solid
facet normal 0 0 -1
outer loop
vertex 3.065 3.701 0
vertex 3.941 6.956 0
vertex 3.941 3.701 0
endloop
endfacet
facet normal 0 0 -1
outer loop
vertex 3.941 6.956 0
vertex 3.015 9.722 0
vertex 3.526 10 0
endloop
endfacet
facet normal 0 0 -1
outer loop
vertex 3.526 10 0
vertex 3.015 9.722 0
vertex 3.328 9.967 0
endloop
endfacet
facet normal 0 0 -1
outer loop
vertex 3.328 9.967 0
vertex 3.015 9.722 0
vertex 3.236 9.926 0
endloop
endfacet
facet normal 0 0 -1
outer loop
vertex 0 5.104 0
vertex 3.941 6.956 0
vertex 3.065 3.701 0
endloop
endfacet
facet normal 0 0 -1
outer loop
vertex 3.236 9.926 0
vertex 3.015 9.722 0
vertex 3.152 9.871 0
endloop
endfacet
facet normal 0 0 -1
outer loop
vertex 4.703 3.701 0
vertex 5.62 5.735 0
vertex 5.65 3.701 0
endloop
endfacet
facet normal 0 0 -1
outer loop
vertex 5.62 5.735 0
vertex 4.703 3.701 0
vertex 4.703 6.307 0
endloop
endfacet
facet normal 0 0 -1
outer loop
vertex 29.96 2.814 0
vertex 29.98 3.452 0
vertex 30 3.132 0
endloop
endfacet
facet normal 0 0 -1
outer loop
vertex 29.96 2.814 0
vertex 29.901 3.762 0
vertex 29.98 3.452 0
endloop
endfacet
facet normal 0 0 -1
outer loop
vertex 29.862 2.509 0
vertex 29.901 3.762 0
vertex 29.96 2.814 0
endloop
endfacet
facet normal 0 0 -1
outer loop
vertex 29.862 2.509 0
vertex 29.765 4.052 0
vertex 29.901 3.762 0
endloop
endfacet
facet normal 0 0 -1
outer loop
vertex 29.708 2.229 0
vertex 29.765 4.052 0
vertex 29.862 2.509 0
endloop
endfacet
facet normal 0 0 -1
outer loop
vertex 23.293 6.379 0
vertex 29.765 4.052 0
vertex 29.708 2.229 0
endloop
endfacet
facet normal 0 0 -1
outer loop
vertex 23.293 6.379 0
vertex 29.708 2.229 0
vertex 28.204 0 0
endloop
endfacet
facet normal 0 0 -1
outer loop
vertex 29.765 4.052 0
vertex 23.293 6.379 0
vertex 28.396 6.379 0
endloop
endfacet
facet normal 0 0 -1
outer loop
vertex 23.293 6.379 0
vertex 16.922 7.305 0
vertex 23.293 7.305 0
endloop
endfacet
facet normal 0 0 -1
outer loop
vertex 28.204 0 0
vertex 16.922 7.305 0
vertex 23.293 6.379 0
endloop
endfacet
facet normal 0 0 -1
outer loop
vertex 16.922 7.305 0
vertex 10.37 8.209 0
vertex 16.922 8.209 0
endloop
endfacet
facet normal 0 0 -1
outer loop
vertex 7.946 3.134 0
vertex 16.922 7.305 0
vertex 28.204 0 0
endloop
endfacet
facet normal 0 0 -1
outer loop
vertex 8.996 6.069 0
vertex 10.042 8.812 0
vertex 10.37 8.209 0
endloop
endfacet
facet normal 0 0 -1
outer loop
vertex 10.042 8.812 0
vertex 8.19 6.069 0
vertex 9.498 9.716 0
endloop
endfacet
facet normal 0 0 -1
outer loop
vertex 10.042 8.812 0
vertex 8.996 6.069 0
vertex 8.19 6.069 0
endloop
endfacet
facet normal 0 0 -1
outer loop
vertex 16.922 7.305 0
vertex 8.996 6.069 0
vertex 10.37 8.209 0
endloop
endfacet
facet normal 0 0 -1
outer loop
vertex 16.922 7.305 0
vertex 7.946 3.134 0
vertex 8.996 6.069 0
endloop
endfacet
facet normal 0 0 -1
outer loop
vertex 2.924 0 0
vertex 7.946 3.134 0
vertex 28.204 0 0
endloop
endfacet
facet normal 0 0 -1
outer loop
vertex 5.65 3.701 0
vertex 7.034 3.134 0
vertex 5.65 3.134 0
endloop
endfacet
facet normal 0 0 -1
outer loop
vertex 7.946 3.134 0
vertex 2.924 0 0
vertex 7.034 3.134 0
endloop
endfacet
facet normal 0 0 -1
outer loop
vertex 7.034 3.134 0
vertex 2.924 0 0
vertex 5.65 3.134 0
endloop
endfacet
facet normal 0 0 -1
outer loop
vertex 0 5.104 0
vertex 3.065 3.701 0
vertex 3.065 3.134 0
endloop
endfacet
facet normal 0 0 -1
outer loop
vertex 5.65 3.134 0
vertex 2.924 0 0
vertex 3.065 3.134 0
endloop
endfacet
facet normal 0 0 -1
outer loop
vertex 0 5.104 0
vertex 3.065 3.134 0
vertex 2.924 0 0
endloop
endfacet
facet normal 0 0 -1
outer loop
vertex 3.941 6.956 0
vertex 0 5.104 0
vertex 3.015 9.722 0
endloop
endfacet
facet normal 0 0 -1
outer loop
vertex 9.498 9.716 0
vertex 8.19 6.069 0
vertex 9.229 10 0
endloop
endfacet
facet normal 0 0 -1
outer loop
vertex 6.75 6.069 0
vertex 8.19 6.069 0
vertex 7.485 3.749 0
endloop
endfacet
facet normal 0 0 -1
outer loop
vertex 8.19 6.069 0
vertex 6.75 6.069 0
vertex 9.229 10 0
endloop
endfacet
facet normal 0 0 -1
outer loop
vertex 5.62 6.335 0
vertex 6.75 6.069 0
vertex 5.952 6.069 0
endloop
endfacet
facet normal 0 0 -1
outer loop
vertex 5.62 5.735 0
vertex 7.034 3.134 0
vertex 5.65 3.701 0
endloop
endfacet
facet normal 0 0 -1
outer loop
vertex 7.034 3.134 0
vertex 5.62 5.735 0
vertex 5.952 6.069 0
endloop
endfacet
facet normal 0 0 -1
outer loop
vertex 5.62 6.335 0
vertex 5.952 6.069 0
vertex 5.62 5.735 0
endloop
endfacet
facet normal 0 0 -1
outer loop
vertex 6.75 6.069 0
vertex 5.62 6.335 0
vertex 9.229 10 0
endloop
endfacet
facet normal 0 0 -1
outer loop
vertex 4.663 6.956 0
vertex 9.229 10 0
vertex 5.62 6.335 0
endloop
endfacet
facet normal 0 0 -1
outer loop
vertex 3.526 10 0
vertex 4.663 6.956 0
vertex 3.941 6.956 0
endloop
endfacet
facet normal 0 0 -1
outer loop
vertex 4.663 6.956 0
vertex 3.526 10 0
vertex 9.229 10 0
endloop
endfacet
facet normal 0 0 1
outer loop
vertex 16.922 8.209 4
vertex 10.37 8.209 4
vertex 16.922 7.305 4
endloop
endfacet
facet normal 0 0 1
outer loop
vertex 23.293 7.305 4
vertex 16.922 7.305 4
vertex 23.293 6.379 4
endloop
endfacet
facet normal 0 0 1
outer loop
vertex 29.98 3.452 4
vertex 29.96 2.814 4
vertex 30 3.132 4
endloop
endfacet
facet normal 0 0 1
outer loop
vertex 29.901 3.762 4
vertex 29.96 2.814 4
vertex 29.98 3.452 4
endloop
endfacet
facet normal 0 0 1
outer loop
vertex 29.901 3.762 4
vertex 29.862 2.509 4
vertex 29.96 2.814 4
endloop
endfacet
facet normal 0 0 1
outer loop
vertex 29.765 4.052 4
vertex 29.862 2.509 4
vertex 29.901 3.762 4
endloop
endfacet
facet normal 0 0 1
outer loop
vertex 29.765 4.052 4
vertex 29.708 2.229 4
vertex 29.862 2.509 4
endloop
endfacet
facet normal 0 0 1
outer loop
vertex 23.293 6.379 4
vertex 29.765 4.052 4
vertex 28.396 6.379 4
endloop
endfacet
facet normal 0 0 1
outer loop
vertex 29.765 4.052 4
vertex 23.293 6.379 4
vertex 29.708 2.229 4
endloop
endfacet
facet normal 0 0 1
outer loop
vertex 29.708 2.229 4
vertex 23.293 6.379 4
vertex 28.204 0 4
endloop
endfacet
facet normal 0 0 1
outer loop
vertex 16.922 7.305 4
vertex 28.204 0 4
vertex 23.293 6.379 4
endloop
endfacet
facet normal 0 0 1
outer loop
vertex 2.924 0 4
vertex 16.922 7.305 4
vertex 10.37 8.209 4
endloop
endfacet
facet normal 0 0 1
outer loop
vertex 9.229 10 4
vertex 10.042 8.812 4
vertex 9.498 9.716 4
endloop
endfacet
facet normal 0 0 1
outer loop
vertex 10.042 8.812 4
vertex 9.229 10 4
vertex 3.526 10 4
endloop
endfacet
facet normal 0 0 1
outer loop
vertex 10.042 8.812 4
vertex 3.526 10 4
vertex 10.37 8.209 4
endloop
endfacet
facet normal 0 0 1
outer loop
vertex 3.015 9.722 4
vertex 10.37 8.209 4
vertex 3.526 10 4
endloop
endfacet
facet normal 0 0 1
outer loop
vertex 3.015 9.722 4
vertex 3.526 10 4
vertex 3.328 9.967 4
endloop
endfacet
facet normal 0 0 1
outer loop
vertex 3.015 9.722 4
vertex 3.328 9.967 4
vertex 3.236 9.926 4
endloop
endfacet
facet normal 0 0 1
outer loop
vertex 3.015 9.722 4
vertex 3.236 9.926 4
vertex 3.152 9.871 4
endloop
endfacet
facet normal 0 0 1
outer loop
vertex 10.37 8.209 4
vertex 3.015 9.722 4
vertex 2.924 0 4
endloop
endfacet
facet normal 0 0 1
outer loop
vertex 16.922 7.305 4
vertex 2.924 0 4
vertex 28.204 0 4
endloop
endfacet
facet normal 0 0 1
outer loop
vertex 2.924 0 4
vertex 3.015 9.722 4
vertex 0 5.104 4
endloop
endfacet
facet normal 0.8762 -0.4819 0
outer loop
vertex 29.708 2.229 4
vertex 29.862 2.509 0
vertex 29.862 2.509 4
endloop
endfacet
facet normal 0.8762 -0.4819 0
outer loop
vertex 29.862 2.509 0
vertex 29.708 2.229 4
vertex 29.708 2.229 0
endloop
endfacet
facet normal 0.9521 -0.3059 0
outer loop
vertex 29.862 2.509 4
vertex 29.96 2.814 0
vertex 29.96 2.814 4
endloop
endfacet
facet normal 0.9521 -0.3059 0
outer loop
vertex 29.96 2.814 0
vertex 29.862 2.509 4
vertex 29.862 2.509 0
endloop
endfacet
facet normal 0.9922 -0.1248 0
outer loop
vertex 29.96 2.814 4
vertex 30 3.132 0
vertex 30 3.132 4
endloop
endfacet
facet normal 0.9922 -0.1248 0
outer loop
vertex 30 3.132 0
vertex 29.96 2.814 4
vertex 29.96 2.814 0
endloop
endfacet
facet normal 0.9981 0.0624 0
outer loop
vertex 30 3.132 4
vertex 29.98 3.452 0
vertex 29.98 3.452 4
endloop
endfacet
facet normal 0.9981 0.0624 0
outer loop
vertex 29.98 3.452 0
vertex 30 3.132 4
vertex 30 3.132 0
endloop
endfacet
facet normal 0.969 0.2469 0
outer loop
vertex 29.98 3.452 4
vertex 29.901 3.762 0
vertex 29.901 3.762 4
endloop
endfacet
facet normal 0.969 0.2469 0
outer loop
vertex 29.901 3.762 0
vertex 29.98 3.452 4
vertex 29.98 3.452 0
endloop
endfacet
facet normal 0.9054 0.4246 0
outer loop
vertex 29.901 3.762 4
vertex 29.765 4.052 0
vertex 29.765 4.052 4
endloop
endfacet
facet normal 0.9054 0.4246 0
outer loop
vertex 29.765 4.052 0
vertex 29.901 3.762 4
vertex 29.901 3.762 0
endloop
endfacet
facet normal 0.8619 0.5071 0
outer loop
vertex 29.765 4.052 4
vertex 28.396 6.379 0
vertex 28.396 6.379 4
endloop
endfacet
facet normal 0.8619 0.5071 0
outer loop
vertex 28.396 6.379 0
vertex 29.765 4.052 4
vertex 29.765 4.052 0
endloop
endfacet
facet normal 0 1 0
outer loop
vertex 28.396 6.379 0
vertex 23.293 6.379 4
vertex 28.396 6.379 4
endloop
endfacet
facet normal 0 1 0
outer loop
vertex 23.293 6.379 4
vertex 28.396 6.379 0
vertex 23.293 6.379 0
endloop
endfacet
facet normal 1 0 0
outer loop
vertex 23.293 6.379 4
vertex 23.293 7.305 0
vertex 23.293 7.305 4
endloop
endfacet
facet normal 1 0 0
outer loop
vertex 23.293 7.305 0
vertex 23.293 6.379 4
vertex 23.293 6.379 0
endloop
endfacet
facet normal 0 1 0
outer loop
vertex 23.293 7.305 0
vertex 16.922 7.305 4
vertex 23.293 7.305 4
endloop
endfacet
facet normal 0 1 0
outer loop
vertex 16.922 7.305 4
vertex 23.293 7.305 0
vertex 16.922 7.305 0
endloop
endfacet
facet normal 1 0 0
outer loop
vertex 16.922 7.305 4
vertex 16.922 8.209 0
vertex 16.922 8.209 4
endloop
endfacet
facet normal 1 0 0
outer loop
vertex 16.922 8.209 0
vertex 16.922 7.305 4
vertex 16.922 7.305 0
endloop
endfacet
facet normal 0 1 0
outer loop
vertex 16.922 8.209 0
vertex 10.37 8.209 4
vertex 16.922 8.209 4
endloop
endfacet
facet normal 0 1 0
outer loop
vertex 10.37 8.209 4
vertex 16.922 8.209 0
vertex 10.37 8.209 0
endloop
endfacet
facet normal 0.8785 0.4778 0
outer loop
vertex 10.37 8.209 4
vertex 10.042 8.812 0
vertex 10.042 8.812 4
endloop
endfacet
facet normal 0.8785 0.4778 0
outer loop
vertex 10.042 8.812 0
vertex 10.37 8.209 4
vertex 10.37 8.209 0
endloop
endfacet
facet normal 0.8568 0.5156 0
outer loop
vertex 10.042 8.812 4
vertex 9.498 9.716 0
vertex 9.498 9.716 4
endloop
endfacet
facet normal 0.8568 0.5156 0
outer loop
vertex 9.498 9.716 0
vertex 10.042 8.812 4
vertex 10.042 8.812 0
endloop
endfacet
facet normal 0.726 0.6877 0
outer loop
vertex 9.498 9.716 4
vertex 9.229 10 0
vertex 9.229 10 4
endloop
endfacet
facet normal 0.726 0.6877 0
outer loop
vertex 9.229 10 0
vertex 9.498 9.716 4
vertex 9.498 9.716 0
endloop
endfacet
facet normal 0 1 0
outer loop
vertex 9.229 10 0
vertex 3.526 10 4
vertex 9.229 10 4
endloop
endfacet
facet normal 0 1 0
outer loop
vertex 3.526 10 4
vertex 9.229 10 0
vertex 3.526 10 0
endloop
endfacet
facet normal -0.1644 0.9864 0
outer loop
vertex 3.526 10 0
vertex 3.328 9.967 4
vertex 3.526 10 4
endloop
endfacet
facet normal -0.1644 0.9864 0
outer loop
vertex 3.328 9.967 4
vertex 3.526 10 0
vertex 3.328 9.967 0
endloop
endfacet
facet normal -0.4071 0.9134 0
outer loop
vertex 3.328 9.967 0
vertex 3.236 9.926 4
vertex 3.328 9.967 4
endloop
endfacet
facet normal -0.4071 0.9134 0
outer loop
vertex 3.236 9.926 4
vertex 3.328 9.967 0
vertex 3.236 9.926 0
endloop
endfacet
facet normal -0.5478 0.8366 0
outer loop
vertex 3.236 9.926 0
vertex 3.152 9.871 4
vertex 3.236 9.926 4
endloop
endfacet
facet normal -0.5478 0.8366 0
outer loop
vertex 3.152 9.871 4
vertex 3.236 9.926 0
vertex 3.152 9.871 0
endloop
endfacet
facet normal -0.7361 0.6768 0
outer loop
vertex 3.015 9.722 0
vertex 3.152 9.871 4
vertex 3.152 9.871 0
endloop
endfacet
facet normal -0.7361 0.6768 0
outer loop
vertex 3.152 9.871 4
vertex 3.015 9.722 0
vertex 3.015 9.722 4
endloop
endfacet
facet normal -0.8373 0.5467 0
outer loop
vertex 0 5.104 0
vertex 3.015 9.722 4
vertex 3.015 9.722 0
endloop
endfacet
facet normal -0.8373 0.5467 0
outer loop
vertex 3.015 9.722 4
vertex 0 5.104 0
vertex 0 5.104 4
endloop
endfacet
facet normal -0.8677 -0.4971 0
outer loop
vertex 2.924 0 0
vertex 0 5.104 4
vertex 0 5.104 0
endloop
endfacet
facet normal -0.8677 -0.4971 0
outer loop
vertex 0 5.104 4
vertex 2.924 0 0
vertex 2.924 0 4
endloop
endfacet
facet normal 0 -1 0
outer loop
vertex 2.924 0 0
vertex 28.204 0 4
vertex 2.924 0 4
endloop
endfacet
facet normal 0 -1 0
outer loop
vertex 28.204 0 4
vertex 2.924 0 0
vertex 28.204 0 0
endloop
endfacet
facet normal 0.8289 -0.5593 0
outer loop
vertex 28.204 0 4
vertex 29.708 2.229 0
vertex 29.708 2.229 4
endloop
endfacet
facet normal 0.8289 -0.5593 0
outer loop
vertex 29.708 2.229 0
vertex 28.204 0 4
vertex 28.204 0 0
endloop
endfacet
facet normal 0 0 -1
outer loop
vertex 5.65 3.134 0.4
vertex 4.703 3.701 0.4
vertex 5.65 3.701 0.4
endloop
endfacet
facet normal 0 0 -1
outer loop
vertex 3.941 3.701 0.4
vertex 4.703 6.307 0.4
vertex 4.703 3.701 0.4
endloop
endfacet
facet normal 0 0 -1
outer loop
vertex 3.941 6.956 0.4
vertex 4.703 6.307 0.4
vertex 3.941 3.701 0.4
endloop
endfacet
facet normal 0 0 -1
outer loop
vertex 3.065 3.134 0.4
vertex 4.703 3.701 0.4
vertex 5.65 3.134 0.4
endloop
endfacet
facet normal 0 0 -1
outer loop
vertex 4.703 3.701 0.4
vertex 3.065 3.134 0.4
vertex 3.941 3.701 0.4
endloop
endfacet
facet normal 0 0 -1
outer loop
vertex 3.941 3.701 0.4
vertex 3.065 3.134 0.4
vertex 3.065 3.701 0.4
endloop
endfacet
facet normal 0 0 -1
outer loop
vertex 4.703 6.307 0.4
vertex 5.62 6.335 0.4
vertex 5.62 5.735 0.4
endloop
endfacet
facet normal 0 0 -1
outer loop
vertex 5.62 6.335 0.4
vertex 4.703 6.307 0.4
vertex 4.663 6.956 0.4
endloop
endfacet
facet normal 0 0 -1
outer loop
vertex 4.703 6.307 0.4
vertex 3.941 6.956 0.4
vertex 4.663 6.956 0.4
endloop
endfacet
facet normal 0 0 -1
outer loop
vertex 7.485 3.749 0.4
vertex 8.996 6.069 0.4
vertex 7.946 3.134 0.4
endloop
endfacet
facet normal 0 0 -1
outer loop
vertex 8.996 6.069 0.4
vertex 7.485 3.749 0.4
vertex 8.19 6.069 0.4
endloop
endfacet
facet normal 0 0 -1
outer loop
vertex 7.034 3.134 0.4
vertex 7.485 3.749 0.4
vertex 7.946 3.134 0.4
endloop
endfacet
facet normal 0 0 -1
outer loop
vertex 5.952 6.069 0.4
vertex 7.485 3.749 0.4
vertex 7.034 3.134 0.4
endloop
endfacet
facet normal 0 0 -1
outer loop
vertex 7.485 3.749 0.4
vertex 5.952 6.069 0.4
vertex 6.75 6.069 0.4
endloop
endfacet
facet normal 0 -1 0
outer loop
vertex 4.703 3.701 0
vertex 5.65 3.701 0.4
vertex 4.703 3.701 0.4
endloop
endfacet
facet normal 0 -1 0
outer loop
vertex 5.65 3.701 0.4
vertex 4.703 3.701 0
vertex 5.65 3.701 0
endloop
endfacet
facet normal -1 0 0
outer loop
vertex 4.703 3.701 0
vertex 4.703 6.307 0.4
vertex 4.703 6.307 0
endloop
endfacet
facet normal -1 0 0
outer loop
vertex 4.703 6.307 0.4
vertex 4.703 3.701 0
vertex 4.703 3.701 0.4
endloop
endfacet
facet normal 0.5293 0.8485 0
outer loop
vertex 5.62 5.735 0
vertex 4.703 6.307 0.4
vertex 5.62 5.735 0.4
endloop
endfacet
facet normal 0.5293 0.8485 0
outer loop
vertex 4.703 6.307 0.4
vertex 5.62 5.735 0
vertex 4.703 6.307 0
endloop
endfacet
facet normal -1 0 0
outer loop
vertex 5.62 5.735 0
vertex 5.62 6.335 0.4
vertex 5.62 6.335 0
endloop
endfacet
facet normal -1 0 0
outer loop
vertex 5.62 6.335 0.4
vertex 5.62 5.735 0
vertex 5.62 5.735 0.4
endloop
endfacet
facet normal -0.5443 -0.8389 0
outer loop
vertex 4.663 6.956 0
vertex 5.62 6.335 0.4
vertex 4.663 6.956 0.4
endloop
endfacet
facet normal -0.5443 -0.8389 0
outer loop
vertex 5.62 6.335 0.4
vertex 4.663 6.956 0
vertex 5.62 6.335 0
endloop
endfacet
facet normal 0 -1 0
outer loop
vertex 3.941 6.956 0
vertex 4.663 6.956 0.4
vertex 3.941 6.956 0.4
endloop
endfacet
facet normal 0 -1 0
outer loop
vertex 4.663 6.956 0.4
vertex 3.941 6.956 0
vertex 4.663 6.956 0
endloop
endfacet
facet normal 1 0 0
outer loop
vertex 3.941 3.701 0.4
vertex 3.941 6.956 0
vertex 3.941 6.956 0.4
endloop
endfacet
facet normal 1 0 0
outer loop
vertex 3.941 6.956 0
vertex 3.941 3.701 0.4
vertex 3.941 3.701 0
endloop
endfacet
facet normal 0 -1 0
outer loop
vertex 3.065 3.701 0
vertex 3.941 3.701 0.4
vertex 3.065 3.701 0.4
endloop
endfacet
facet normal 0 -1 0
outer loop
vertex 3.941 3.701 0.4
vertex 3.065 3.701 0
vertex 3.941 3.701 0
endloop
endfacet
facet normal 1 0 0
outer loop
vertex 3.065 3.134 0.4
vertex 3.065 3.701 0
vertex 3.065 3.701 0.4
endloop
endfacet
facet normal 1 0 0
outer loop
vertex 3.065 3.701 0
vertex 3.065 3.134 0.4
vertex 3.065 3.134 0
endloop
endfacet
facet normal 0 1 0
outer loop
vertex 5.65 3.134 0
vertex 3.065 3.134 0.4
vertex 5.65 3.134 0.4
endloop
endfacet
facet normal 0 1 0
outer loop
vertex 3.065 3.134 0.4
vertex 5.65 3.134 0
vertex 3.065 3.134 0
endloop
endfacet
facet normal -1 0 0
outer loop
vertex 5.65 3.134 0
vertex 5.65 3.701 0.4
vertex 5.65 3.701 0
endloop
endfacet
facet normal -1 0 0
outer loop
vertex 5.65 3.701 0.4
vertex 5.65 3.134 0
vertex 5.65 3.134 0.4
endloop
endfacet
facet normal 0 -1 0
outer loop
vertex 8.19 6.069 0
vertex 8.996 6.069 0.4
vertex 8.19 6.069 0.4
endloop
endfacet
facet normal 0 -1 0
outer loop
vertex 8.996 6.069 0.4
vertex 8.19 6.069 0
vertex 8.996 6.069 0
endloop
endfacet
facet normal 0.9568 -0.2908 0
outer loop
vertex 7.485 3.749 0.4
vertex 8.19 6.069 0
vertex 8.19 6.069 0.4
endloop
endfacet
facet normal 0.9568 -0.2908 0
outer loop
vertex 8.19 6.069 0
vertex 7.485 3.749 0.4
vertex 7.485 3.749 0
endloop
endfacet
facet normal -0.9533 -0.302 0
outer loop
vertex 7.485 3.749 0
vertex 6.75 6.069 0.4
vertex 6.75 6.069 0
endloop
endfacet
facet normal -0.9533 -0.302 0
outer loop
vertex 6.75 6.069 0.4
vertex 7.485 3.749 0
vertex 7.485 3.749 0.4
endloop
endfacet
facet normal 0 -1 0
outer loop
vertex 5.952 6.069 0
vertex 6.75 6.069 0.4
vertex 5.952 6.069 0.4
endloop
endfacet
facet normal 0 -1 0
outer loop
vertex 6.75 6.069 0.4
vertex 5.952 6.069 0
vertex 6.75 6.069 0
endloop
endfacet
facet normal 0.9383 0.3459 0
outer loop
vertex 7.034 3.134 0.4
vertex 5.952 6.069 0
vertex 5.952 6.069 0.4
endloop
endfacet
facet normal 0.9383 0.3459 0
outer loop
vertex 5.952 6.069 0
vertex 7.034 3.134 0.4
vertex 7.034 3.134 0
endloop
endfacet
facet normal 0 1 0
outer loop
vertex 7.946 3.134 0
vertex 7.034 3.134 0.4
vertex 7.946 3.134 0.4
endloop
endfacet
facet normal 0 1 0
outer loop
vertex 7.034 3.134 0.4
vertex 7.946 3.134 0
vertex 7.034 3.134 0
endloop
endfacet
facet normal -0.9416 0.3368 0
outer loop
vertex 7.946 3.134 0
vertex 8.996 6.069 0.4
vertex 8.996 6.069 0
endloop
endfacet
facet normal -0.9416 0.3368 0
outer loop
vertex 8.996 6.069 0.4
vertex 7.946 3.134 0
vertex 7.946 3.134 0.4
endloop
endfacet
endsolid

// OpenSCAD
// test3 — generated by protobot from a sketch (input.jpg)
// 2026-10-28
//
// Print: Prusa Core One, 0.4 mm nozzle, PLA, 0.2 mm layers, flat on the bed.
// The outline is stored in a 0..1 unit box and scaled by LENGTH/WIDTH, so
// the three measurements below are all you need to change. Re-export with:
//   openscad --backend=manifold --export-format binstl -o test3.stl test3.scad
//
// Dimension tags: [M] = given by the user, [S] = traced from the sketch.

/* [Measurements] */
LENGTH    = 30;   // [M] X extent, mm
WIDTH     = 10;   // [M] Y extent, mm
THICKNESS = 4;   // [M] extrusion height, mm

/* [Edge finish] */
// Perimeter edges (outline AND holes), top and bottom faces.
// "fillet" = rounded, "chamfer" = 45°, "none" = sharp. Built in LAYER steps,
// i.e. exactly as the printer will lay it down.
EDGE_TOP_KIND    = "none";
EDGE_TOP         = 0;     // mm
EDGE_BOTTOM_KIND = "none";
EDGE_BOTTOM      = 0;     // mm
LAYER            = 0.2;   // mm, print layer height

/* [Version stamp] */
VERSION        = 1;       // bump every revision
VERSION_POS    = [0.2000, 0.5000];  // [S] unit-box spot deepest inside the shape
VERSION_SIZE   = 4;      // mm text height
VERSION_DEPTH  = 0.4;    // mm, 2 layers at 0.2

/* [Hidden] */
// [S] traced outline (+ holes), unit box, y up.
OUTLINE_PTS = [
    [0.94652,0.63789], [0.99217,0.40518], [0.99669,0.37621], [0.99933,0.34518], [1.00000,0.31320], [0.99867,0.28141],
    [0.99540,0.25094], [0.99029,0.22288], [0.94014,0.00000], [0.09748,0.00000], [0.00000,0.51040], [0.10052,0.97223],
    [0.10507,0.98708], [0.10788,0.99262], [0.11095,0.99668], [0.11754,1.00000], [0.30764,1.00000], [0.31660,0.97162],
    [0.33472,0.88120], [0.34567,0.82088], [0.56408,0.82088], [0.56408,0.73052], [0.77645,0.73052], [0.77645,0.63789]
];
OUTLINE_PATHS = [
    [for (i = [0:23]) i]
];

module outline_2d() {
    scale([LENGTH, WIDTH]) polygon(points = OUTLINE_PTS, paths = OUTLINE_PATHS);
}

// Debossed into the bottom face, mirrored so it reads from underneath.
module version_stamp() {
    if (!is_undef(VERSION_POS) && VERSION_SIZE > 0)
        translate([VERSION_POS[0] * LENGTH, VERSION_POS[1] * WIDTH, -0.01])
            linear_extrude(VERSION_DEPTH + 0.01)
                mirror([1, 0])
                    text(str("v", VERSION), size = VERSION_SIZE,
                         font = "Liberation Sans:style=Bold",
                         halign = "center", valign = "center");
}

// How far the outline is pulled in at depth d (0..r) into a finished edge.
function edge_inset(kind, r, d) =
    kind == "chamfer" ? max(0, r - d) :
    kind == "fillet"  ? r - sqrt(max(0, r * r - (r - min(d, r)) * (r - min(d, r)))) : 0;

module body() {
    nb = EDGE_BOTTOM_KIND == "none" ? 0 : ceil(EDGE_BOTTOM / LAYER - 1e-6);
    nt = EDGE_TOP_KIND    == "none" ? 0 : ceil(EDGE_TOP / LAYER - 1e-6);
    zb = nb * LAYER;
    zt = nt * LAYER;
    union() {
        // straight-walled core, overlapping the finished layers (no shared faces)
        translate([0, 0, zb - (nb > 0 ? 0.01 : 0)])
            linear_extrude(THICKNESS - zb - zt + (nb > 0 ? 0.01 : 0) + (nt > 0 ? 0.01 : 0))
                outline_2d();
        if (nb > 0) for (i = [0 : nb - 1])
            translate([0, 0, i * LAYER])
                linear_extrude(LAYER + 0.01)
                    offset(delta = -edge_inset(EDGE_BOTTOM_KIND, EDGE_BOTTOM, (i + 0.5) * LAYER))
                        outline_2d();
        if (nt > 0) for (i = [0 : nt - 1])
            translate([0, 0, THICKNESS - (i + 1) * LAYER - (i < nt - 1 ? 0.01 : 0)])
                linear_extrude(LAYER + (i < nt - 1 ? 0.01 : 0))
                    offset(delta = -edge_inset(EDGE_TOP_KIND, EDGE_TOP, (i + 0.5) * LAYER))
                        outline_2d();
    }
}

module part() {
    $fa = 2; $fs = 0.4;
    difference() {
        body();
        version_stamp();
    }
}

part();
